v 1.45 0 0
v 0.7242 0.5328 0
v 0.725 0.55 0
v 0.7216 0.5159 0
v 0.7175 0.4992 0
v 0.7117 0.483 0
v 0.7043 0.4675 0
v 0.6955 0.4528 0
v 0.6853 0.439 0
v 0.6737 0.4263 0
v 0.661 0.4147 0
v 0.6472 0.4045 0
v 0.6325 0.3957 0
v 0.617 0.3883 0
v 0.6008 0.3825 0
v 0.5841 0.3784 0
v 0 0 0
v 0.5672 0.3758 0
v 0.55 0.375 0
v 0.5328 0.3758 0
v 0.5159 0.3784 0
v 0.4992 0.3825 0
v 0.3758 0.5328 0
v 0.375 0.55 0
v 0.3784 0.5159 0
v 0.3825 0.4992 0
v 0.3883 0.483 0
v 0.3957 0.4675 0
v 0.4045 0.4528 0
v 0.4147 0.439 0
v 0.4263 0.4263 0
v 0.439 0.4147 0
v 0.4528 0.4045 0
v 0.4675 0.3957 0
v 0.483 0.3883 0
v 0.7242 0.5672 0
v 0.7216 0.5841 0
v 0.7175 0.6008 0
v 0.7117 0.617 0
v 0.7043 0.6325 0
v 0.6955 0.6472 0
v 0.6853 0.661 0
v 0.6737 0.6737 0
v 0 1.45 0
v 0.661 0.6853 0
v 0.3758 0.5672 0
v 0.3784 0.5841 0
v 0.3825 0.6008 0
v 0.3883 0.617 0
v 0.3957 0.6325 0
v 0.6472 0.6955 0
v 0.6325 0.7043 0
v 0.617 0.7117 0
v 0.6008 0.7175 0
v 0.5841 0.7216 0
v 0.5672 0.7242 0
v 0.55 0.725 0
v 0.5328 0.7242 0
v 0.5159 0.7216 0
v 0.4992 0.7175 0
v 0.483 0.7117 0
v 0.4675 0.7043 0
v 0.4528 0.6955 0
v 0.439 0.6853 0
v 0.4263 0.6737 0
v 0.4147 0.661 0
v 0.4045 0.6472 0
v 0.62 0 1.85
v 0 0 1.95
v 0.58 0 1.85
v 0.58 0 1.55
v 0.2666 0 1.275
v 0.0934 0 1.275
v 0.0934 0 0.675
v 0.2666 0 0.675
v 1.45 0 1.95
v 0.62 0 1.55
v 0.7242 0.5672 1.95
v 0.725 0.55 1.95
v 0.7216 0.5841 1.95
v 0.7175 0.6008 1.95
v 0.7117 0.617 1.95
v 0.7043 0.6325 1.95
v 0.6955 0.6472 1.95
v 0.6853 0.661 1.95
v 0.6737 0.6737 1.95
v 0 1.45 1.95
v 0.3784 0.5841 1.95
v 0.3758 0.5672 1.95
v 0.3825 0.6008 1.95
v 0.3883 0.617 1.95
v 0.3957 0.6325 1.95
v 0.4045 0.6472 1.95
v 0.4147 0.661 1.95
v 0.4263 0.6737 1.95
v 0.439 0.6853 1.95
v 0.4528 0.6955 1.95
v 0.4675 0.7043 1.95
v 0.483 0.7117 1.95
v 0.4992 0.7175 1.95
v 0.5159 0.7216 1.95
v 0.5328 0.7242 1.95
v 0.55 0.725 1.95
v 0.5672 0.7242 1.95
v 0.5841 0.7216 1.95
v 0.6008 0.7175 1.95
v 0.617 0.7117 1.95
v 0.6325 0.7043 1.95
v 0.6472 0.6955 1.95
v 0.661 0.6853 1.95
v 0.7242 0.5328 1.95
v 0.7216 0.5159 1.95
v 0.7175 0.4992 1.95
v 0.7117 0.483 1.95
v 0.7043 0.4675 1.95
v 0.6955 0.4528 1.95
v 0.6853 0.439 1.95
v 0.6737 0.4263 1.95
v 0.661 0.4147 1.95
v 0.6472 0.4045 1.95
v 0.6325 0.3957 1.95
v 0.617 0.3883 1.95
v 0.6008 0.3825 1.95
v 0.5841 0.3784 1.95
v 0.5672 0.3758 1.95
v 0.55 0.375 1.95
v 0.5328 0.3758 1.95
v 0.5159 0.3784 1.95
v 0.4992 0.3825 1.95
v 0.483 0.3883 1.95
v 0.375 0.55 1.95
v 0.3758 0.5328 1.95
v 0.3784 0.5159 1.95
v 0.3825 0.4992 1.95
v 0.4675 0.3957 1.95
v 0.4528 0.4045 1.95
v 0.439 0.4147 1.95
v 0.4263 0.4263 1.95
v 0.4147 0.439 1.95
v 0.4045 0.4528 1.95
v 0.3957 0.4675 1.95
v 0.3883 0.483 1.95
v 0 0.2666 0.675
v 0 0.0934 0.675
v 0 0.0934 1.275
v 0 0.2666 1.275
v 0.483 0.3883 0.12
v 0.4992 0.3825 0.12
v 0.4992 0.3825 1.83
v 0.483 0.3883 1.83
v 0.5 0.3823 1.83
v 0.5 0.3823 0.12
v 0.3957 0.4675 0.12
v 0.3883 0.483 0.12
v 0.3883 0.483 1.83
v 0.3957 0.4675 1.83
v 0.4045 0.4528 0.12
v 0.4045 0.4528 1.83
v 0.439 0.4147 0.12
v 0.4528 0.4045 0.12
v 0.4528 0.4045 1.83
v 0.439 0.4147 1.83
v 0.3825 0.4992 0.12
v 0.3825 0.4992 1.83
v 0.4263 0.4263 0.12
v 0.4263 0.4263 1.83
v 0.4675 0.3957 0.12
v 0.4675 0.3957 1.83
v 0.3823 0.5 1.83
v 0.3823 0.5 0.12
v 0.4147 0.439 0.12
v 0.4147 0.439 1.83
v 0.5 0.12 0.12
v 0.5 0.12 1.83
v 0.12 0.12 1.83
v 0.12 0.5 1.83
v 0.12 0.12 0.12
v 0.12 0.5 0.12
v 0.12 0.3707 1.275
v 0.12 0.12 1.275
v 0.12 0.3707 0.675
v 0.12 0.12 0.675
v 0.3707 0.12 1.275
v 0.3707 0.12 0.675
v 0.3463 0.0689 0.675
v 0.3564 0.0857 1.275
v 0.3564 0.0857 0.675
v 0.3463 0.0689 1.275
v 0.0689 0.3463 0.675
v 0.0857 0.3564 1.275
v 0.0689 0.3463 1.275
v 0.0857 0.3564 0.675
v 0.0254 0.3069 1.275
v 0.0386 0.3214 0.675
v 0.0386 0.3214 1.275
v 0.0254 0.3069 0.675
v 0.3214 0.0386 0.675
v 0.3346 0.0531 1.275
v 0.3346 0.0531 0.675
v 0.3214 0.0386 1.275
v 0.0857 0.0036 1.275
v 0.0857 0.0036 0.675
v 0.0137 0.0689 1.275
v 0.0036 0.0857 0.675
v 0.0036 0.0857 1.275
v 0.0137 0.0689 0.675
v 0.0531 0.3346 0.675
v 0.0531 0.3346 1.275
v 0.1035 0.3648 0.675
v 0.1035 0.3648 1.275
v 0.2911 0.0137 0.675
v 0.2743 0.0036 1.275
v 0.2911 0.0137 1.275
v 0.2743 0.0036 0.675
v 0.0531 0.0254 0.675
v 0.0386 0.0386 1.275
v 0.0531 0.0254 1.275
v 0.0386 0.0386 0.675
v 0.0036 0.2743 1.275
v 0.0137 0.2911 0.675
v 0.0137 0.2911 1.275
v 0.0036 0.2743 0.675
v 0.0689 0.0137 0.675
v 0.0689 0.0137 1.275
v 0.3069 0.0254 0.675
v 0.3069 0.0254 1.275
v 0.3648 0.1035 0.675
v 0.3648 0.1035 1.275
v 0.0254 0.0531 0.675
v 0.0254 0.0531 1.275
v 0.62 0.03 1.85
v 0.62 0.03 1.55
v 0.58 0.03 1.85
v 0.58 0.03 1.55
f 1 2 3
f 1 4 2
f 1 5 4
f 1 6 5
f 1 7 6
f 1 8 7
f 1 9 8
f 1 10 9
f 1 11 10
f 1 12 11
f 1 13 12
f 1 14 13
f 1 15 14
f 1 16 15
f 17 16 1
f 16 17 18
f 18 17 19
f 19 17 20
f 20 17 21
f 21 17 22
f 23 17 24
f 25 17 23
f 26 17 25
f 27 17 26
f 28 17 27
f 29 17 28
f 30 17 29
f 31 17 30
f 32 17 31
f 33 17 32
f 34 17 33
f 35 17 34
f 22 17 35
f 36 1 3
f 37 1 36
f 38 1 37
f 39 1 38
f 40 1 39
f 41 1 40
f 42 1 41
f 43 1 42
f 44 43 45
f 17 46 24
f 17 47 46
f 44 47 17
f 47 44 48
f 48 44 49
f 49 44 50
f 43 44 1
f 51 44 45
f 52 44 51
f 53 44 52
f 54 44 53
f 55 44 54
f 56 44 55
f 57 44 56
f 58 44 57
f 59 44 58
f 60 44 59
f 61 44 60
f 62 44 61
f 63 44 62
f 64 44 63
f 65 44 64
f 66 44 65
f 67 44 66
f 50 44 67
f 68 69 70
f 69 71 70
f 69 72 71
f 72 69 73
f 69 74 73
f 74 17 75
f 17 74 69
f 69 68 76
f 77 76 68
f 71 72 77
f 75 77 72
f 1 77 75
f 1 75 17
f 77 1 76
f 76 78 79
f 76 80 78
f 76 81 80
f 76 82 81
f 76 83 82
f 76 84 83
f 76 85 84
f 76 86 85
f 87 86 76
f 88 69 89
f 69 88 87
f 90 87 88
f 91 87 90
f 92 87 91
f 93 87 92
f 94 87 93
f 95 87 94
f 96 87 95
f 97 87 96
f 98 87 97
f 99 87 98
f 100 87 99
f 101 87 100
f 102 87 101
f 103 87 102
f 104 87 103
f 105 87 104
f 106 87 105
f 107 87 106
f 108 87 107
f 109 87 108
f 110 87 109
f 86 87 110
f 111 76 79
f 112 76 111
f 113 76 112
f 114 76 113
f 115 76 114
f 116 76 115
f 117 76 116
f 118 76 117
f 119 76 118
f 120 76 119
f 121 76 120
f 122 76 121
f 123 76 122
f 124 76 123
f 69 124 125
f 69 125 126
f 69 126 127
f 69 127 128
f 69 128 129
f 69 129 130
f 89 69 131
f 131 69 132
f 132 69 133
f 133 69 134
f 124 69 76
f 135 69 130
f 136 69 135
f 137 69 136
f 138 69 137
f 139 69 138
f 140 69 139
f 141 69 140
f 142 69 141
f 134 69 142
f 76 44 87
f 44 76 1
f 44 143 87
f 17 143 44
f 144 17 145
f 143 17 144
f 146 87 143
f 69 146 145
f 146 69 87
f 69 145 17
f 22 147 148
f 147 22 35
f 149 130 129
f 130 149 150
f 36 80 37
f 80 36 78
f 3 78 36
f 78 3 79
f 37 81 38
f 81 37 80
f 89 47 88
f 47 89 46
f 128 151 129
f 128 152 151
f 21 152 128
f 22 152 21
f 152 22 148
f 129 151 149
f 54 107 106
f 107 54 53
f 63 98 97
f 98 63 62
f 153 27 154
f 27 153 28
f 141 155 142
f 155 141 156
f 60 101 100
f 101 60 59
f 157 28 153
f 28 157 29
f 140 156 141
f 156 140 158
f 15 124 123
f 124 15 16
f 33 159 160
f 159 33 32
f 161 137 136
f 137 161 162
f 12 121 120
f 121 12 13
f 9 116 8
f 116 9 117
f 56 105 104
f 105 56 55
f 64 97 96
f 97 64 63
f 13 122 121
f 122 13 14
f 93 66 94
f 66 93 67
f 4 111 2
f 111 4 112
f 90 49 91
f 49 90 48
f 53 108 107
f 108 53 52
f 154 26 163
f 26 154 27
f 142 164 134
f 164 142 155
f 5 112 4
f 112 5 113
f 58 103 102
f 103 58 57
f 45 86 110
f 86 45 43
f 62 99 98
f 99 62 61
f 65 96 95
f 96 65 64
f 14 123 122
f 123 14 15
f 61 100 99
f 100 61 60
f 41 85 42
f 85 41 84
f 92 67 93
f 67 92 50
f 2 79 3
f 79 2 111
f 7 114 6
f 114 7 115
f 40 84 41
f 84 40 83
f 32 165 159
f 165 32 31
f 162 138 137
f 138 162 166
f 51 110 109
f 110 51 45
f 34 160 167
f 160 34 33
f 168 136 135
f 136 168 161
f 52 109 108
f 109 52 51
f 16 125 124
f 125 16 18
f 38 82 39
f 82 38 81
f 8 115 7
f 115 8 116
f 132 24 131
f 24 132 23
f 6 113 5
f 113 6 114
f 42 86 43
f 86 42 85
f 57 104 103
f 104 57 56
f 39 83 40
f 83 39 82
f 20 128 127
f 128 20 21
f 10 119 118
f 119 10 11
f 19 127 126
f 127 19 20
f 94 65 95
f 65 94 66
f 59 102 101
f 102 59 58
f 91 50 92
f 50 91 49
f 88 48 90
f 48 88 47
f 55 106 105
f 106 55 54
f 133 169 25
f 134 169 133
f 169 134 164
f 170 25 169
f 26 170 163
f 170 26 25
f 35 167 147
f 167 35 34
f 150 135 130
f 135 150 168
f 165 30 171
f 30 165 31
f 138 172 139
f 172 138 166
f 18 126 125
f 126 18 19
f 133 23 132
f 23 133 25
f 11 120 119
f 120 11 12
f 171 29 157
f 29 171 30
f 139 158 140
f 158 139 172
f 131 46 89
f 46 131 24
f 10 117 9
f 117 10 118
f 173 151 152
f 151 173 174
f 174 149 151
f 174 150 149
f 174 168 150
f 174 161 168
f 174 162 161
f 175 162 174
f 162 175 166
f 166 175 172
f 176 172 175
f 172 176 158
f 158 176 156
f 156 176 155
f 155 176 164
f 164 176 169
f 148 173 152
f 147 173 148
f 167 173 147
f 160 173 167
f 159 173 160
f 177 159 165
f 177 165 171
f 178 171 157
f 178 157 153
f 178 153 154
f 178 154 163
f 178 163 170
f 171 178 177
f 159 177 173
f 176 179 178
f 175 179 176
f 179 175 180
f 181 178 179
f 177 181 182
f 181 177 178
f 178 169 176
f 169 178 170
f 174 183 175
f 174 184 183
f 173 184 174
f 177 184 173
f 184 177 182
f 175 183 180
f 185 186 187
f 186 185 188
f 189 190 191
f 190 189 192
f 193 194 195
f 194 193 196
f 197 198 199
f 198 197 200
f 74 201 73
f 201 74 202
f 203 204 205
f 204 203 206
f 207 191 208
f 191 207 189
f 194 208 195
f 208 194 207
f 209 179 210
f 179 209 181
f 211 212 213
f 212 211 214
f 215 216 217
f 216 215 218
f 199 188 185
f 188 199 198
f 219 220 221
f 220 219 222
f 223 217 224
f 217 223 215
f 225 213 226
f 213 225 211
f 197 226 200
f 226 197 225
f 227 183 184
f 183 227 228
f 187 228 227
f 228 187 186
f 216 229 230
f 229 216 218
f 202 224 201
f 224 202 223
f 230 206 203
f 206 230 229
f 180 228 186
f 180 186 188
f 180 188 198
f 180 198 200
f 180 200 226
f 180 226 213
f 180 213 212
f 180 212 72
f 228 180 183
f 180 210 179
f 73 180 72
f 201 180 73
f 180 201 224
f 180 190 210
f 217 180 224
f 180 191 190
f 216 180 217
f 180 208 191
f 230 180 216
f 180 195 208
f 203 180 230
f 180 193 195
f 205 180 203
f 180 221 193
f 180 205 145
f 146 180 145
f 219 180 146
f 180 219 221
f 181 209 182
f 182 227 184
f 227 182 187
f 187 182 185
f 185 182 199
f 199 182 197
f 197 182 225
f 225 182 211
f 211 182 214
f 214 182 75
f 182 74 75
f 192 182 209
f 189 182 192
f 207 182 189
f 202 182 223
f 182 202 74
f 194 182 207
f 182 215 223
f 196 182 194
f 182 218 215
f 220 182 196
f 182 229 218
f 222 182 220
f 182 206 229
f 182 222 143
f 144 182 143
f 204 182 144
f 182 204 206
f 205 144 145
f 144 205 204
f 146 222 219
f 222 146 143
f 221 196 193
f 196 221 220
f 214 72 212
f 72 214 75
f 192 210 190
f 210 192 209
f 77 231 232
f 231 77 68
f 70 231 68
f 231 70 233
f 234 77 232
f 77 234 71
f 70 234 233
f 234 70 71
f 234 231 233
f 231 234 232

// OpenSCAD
// FireWatch Industrial Infrastructure - Optimized Single-Chamber Launcher
$fn = 64; 

// Streamlined Structural Constraints (Strictly under 1.2 cubic inches)
block_width     = 1.45; // Inches - Reduced width to shave off material mass
block_height    = 1.45; 
block_length    = 1.95; // Shortened length optimized for single capsule chambering
wall_thick      = 0.12; // 3mm high-impact polymer walls
barrel_diameter = 0.35; // Sized for standard single 9mm/.35" gel capsule

module single_chamber_launcher() {
    difference() {
        // 1. Core Lightweight Prism Housing (Molded in Standard Fire Red)
        linear_extrude(height = block_length) {
            polygon(points=[[0,0], [block_width,0], [0,block_height]]);
        }
        
        // 2. Smooth-Bore Launch Cylinder (Single Barrel)
        translate([0.55, 0.55, -0.05])
            cylinder(h = block_length + 0.1, d = barrel_diameter);
            
        // 3. Compact Valve Cavity (Nests miniature 12V electromechanical valve)
        translate([wall_thick, wall_thick, wall_thick])
            cube([0.38, 0.38, block_length - (wall_thick * 2)]);
            
        // 4. IP67 Data/Control Port Bulkhead Entry
        translate([0.18, 0.18, block_length / 2])
            rotate([0, 0, -45])
                cylinder(h = 0.6, d = 0.40, center=true);
                
        // 5. Camera Alignment Reference Notch
        translate([block_width * 0.4, -0.01, block_length - 0.4])
            cube([0.04, 0.04, 0.3]);
    }
}

single_chamber_launcher();
